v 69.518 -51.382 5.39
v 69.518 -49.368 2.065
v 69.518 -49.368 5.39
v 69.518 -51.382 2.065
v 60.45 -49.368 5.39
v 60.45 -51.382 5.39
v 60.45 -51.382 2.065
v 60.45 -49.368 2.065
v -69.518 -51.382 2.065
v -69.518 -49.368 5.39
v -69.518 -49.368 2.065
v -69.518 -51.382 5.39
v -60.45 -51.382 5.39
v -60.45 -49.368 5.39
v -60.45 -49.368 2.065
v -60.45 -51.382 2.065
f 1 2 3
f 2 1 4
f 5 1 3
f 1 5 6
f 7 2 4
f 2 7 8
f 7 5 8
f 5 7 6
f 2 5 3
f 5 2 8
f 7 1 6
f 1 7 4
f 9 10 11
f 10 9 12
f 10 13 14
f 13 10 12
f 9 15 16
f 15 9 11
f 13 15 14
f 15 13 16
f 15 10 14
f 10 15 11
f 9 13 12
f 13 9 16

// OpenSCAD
plate_h=1.55;
board_h=1.5;
bottom_h=2.05;
bottom_space=3.5;
side_h=9;

tolerance=0.2;
screw_d=2.3;


actual_hole_d=6;
jack_d=7;

fix_scale=1.0075; // The boards are a bit bigger? My priter uncalibrated ?

$fn=30;

module tray(plate_h=plate_h,bottom_h=bottom_h,side_h=side_h,tolerance=tolerance,outline_file="outer_outline.dxf",sides=true,bottom_space=bottom_space) {

  in_offset = sides ? tolerance : bottom_h ;
  difference(){
    linear_extrude(bottom_h+side_h+plate_h)
      offset(r=bottom_h)
        import(outline_file);
    translate([0,0,bottom_h])
      linear_extrude(bottom_h+side_h+plate_h)
        offset(r=in_offset)
          import(outline_file);    
  }
}

module bottom(plate_h=plate_h,bottom_h=bottom_h,side_h=side_h,tolerance=tolerance,outline_file="outer_outline.dxf",holes_file="mount_holes.dxf",sides=true,bottom_space=bottom_space) {
  difference(){
    union(){
      tray(plate_h,bottom_h=bottom_h,side_h=side_h,tolerance=tolerance,outline_file=outline_file,sides=sides,bottom_space=bottom_space);
      linear_extrude(bottom_h+side_h)
        offset(delta=-tolerance/2)
          import(holes_file); // "columns"
      linear_extrude(bottom_h+bottom_space)
        offset(delta=1)
          import(holes_file); // plate rests
    }
    linear_extrude(bottom_h+side_h+1)
      offset(delta=-(actual_hole_d-screw_d)/2)
        import(holes_file); // screw holes
    linear_extrude(bottom_h)
      offset(delta=-0.4)
        import(holes_file); // nut hole
  }
}

module brain_translate(){
  translate([-88.79,-5.7,0])
    children();
}

module brain_bottom(plate_h=plate_h,bottom_h=bottom_h,side_h=side_h,tolerance=tolerance,outline_file="brain_outline.dxf",holes_file="brain_holes.dxf",sides=true,bottom_space=bottom_space){
  brain_translate()
    bottom(plate_h=plate_h,bottom_h=bottom_h,side_h=side_h,tolerance=tolerance,outline_file=outline_file,holes_file=holes_file,sides=sides,bottom_space=bottom_space);
}

module full_bottom(plate_h=plate_h,bottom_h=bottom_h,side_h=side_h,tolerance=tolerance){
  union(){
    difference(){
      bottom(plate_h=plate_h,bottom_h=bottom_h,side_h=side_h,tolerance=tolerance);
      brain_translate()
        linear_extrude(side_h+2*bottom_h+bottom_space)
          import("brain_bigger_outline.dxf");
    }
  }
}

module plate(plate_h=plate_h) {
  linear_extrude(plate_h)
    import("plate_outline.dxf");
}

module cutouts(plate_h=plate_h) {
linear_extrude(plate_h)
  union(){
    import("plate_cutouts.dxf");  
    // For M3 - check if screw head fits!
    //offset(r=-1.45)
    // For M2.5
    offset(r=-1.67)
    // For M2
    //offset(r=-1.86)
      import("mount_holes.dxf");
  }
}

module plate_with_cutouts(plate_h=plate_h){
  difference(){
    plate(plate_h);
    cutouts(plate_h);
  }
}

module plate_sample(plate_h=plate_h){
  intersection(){
    union(){
      translate([40,-195,0])
        rotate([0,0,25])
          cube([65,42,plate_h]);
      translate([81,-169.5,0])
        cube([130,40,plate_h]);
    }

    plate_with_cutouts(plate_h);
  }
}

module brain_bottom_cartridge(usb=false) {
  slider_w=2;
  slider_l=9;
  slider_gap=0.1;
  difference(){
    union(){
      intersection(){
        brain_bottom();
        brain_translate()
          linear_extrude(side_h+2*bottom_h+bottom_space)
            import("brain_bigger_outline.dxf");
      }
      translate([60,-49-slider_w,bottom_h])
        cube([slider_l,slider_w,bottom_space-tolerance]); // slider rail
    }
    linear_extrude(10)
      offset(delta=1.2)
        import("mount_holes.dxf");
    if(usb)
      translate([40,-80,bottom_h+bottom_space+board_h+0.5])
        cube([20,20,20]);
    translate([41.5,-47.15,bottom_h+side_h-0.5])
      translate([jack_d/2,0,0])
        rotate([90,0,0])
        union(){
          translate([-jack_d/2,0,0])
            cube([jack_d,jack_d,bottom_h]);
          if(usb)
            translate([jack_d/2+2,-jack_d/2+1,0])
              cube([10,10,bottom_h]);
          cylinder(d=jack_d,h=bottom_h);
        }
  }  
}
module all(plate=false,bottom=false,brain=false, right=false, left=false){
  scale([fix_scale,fix_scale,fix_scale]){
      
    if(left){
      if(bottom)
        translate([20,0,0])
          full_bottom();
      if(brain)
        translate([0,0,0])
          brain_bottom_cartridge(usb=true);
      if(plate)
        translate([0,-160,0])
          //sample();
          plate_with_cutouts();

    }
    if(right || !right && !left) // right hand by default
      mirror([1,0,0]){
        if(bottom)
          translate([20,0,0])
            full_bottom();
        if(brain)
          translate([0,0,0])
            brain_bottom_cartridge(usb=false);
        if(plate)
          translate([0,-160,0])
            //sample();
            plate_with_cutouts();

      }  
  }
}

all(brain=true,bottom=true,plate=true,left=true,right=true);

//plate_sample();
//all(bottom=true,left=true,right=true);
